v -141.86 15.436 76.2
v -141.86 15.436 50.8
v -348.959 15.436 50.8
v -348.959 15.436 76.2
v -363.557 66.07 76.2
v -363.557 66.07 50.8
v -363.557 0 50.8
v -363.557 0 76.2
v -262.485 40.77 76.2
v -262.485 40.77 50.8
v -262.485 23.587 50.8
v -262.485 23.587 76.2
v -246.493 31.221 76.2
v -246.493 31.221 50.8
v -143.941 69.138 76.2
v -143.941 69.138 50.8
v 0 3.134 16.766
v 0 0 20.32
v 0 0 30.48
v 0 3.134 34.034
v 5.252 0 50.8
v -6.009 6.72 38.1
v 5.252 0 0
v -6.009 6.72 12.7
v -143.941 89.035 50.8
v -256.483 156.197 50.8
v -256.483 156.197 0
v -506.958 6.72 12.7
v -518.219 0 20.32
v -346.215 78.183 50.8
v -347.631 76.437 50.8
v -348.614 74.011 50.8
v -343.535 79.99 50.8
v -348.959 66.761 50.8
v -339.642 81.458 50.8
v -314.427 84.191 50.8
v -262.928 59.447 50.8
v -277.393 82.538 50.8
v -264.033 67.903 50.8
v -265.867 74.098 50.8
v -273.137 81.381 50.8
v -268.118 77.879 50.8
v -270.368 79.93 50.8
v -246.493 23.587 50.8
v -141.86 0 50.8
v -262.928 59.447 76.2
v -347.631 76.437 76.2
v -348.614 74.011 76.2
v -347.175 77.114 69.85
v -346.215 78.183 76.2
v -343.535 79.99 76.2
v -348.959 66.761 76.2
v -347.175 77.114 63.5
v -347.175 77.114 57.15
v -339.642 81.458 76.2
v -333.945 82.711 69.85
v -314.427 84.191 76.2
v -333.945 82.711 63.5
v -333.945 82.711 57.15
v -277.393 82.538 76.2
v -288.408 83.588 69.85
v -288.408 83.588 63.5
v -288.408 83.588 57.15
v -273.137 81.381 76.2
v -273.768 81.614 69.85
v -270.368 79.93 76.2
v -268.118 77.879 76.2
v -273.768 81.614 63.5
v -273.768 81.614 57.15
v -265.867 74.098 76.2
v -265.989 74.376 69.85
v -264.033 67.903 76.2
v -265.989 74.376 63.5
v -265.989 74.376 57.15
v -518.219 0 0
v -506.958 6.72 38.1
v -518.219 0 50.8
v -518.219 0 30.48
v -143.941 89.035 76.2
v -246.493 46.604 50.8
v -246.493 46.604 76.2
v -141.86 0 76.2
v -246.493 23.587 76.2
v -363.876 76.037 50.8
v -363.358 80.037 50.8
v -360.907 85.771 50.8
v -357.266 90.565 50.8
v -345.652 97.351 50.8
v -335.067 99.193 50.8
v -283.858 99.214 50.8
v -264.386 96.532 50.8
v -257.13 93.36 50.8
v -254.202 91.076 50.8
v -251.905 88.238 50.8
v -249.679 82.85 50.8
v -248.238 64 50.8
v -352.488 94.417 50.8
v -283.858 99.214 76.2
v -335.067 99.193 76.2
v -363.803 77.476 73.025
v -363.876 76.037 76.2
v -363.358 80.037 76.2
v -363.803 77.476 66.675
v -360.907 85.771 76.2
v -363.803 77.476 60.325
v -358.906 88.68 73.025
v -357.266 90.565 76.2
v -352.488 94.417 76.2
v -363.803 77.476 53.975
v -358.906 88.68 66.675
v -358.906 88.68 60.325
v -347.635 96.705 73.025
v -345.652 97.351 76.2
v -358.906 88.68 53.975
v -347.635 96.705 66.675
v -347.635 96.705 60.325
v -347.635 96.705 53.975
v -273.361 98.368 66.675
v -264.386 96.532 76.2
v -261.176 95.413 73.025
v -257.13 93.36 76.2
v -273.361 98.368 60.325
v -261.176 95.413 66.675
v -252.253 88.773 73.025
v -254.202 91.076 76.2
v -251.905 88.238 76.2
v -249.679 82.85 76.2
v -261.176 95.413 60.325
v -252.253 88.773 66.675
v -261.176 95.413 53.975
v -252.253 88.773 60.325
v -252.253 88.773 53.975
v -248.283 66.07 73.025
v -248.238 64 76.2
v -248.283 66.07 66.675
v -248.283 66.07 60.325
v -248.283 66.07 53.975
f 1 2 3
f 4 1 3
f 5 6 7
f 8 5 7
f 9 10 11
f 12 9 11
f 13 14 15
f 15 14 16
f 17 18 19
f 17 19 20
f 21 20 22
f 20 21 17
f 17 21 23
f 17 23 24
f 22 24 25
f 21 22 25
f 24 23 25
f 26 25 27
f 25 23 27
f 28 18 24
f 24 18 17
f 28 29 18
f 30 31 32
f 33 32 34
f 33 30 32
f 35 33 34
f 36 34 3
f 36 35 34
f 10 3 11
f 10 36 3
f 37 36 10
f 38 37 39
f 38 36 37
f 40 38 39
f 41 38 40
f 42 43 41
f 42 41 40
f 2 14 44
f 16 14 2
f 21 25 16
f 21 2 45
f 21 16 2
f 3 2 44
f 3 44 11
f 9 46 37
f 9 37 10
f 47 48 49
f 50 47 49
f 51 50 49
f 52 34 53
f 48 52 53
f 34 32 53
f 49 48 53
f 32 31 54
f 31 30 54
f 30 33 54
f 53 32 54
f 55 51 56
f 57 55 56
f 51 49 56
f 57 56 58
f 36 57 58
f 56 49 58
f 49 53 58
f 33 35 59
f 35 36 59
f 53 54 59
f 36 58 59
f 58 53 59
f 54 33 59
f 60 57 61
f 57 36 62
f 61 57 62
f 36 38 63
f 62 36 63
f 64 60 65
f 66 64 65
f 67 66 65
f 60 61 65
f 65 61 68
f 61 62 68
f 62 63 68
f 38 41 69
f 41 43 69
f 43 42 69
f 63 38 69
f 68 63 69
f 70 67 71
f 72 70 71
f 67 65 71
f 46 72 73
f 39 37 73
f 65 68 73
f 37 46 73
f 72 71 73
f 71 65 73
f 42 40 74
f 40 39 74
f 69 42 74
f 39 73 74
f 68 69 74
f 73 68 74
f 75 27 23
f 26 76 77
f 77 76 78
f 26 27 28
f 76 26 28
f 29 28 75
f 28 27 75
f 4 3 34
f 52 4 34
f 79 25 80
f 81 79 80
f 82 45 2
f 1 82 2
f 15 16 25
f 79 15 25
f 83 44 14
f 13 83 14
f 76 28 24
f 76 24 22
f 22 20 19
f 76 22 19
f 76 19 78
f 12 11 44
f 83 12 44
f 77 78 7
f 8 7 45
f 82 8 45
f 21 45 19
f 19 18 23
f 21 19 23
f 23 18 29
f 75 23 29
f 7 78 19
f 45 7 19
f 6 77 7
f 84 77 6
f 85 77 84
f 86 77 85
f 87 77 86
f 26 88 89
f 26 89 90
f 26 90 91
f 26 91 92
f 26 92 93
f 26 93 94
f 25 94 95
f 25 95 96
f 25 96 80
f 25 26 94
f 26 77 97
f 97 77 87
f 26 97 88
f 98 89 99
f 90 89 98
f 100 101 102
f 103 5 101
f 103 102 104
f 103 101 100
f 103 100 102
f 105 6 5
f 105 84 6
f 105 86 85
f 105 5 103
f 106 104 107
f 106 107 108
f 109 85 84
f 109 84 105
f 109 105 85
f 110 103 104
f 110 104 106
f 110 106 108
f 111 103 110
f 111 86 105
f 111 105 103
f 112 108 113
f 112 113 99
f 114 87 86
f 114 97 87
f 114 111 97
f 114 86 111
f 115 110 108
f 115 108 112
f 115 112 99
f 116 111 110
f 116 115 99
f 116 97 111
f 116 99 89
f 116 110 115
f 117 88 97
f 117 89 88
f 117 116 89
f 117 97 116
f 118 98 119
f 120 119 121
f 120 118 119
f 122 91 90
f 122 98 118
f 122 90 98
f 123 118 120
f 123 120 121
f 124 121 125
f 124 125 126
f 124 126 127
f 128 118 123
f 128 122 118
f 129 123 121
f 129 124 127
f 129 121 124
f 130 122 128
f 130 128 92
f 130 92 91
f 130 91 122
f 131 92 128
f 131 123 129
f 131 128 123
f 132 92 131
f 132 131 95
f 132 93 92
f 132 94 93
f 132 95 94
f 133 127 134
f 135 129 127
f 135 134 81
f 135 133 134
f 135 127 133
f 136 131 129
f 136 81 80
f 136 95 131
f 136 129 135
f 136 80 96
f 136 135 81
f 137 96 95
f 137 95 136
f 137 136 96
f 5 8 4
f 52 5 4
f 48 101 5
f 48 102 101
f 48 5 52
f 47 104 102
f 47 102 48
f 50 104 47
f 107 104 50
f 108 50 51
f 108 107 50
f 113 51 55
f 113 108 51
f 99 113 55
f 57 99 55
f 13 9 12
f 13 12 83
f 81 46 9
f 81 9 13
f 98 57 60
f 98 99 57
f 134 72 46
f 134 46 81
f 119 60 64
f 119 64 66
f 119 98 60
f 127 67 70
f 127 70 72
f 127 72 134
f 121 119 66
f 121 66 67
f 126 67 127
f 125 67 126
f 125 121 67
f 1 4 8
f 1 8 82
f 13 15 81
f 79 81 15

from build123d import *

# Parameters (mm, degrees)
F1_DEPTH = 50.8
F3_DEPTH = 518.2199364311
F5_DEPTH = 25.4


with BuildPart() as f1:
    # F0 (on Top) → F1 (new body)
    with BuildSketch(Plane.XY):
        Polygon((-256.483467652, 156.1972611251), (-518.2189364311, 0), (5.2520011271, 0), align=None)
    extrude(amount=F1_DEPTH)

    # F2 (on Right) → F3 (cut, through all)
    with BuildSketch(Plane.YZ):
        Polygon((6.7202083301, 38.1), (0, 30.48), (0, 20.32), (6.7202083301, 12.7), align=None)
    extrude(amount=-F3_DEPTH, mode=Mode.SUBTRACT)

    # F4 (on face) → F5 (join)
    with BuildSketch(Plane.XY.offset(50.8)):
        with BuildLine():
            Line((-363.5565638542, 66.0699382424), (-363.5565638542, 15.4361305758))
            Line((-363.5565638542, 15.4361305758), (-348.9585369825, 15.4361305758))
            Line((-348.9585369825, 15.4361305758), (-348.9585369825, 66.7609721422))
            add(Edge.make_bspline(
                [(-348.9585369825, 66.7609721422), (-349.1962850094, 72.1294507384), (-349.340803371, 85.5928406176), (-287.6615089898, 84.1058113884), (-262.8928370601, 81.391743052), (-262.399105211, 55.5299626512), (-262.4850422144, 40.7699868083)],
                knots=[0, 0, 0, 0, 0.1668742466, 0.5097494757, 0.7240103804, 1, 1, 1, 1], degree=3))
            Line((-262.4850422144, 40.7699868083), (-262.4850422144, 23.5870201141))
            Line((-262.4850422144, 23.5870201141), (-246.4926242828, 23.5870201141))
            Line((-246.4926242828, 23.5870201141), (-246.4926242828, 31.2213213871))
            Line((-246.4926242828, 31.2213213871), (-143.9413215727, 69.1381444045))
            Line((-143.9413215727, 69.1381444045), (-143.9413215727, 89.0348888997))
            Line((-143.9413215727, 89.0348888997), (-246.4926242828, 46.603564173))
            add(Edge.make_bspline(
                [(-363.5565638542, 66.0699382424), (-363.2831573486, 71.5237334371), (-365.6765544545, 78.9120083056), (-355.040460294, 96.3197217064), (-331.9011142788, 100.4510749559), (-301.9417077036, 98.9408625209), (-274.3425806674, 99.936876108), (-247.8596834541, 92.3872071167), (-248.6338026523, 64.1174365029), (-247.7710895443, 55.5507833564), (-246.4926242828, 46.603564173)],
                knots=[0, 0, 0, 0, 0.0967978336, 0.2071312198, 0.3339171066, 0.4812298803, 0.6246455368, 0.7535419216, 0.8817715915, 1, 1, 1, 1], degree=3))
        make_face()
        Polygon((-363.5565638542, 15.4361305758), (-363.5565638542, 0), (-141.8597176671, 0), (-141.8597176671, 15.4361305758), (-348.9585369825, 15.4361305758), align=None)
    extrude(amount=F5_DEPTH)


solid = f1.part
